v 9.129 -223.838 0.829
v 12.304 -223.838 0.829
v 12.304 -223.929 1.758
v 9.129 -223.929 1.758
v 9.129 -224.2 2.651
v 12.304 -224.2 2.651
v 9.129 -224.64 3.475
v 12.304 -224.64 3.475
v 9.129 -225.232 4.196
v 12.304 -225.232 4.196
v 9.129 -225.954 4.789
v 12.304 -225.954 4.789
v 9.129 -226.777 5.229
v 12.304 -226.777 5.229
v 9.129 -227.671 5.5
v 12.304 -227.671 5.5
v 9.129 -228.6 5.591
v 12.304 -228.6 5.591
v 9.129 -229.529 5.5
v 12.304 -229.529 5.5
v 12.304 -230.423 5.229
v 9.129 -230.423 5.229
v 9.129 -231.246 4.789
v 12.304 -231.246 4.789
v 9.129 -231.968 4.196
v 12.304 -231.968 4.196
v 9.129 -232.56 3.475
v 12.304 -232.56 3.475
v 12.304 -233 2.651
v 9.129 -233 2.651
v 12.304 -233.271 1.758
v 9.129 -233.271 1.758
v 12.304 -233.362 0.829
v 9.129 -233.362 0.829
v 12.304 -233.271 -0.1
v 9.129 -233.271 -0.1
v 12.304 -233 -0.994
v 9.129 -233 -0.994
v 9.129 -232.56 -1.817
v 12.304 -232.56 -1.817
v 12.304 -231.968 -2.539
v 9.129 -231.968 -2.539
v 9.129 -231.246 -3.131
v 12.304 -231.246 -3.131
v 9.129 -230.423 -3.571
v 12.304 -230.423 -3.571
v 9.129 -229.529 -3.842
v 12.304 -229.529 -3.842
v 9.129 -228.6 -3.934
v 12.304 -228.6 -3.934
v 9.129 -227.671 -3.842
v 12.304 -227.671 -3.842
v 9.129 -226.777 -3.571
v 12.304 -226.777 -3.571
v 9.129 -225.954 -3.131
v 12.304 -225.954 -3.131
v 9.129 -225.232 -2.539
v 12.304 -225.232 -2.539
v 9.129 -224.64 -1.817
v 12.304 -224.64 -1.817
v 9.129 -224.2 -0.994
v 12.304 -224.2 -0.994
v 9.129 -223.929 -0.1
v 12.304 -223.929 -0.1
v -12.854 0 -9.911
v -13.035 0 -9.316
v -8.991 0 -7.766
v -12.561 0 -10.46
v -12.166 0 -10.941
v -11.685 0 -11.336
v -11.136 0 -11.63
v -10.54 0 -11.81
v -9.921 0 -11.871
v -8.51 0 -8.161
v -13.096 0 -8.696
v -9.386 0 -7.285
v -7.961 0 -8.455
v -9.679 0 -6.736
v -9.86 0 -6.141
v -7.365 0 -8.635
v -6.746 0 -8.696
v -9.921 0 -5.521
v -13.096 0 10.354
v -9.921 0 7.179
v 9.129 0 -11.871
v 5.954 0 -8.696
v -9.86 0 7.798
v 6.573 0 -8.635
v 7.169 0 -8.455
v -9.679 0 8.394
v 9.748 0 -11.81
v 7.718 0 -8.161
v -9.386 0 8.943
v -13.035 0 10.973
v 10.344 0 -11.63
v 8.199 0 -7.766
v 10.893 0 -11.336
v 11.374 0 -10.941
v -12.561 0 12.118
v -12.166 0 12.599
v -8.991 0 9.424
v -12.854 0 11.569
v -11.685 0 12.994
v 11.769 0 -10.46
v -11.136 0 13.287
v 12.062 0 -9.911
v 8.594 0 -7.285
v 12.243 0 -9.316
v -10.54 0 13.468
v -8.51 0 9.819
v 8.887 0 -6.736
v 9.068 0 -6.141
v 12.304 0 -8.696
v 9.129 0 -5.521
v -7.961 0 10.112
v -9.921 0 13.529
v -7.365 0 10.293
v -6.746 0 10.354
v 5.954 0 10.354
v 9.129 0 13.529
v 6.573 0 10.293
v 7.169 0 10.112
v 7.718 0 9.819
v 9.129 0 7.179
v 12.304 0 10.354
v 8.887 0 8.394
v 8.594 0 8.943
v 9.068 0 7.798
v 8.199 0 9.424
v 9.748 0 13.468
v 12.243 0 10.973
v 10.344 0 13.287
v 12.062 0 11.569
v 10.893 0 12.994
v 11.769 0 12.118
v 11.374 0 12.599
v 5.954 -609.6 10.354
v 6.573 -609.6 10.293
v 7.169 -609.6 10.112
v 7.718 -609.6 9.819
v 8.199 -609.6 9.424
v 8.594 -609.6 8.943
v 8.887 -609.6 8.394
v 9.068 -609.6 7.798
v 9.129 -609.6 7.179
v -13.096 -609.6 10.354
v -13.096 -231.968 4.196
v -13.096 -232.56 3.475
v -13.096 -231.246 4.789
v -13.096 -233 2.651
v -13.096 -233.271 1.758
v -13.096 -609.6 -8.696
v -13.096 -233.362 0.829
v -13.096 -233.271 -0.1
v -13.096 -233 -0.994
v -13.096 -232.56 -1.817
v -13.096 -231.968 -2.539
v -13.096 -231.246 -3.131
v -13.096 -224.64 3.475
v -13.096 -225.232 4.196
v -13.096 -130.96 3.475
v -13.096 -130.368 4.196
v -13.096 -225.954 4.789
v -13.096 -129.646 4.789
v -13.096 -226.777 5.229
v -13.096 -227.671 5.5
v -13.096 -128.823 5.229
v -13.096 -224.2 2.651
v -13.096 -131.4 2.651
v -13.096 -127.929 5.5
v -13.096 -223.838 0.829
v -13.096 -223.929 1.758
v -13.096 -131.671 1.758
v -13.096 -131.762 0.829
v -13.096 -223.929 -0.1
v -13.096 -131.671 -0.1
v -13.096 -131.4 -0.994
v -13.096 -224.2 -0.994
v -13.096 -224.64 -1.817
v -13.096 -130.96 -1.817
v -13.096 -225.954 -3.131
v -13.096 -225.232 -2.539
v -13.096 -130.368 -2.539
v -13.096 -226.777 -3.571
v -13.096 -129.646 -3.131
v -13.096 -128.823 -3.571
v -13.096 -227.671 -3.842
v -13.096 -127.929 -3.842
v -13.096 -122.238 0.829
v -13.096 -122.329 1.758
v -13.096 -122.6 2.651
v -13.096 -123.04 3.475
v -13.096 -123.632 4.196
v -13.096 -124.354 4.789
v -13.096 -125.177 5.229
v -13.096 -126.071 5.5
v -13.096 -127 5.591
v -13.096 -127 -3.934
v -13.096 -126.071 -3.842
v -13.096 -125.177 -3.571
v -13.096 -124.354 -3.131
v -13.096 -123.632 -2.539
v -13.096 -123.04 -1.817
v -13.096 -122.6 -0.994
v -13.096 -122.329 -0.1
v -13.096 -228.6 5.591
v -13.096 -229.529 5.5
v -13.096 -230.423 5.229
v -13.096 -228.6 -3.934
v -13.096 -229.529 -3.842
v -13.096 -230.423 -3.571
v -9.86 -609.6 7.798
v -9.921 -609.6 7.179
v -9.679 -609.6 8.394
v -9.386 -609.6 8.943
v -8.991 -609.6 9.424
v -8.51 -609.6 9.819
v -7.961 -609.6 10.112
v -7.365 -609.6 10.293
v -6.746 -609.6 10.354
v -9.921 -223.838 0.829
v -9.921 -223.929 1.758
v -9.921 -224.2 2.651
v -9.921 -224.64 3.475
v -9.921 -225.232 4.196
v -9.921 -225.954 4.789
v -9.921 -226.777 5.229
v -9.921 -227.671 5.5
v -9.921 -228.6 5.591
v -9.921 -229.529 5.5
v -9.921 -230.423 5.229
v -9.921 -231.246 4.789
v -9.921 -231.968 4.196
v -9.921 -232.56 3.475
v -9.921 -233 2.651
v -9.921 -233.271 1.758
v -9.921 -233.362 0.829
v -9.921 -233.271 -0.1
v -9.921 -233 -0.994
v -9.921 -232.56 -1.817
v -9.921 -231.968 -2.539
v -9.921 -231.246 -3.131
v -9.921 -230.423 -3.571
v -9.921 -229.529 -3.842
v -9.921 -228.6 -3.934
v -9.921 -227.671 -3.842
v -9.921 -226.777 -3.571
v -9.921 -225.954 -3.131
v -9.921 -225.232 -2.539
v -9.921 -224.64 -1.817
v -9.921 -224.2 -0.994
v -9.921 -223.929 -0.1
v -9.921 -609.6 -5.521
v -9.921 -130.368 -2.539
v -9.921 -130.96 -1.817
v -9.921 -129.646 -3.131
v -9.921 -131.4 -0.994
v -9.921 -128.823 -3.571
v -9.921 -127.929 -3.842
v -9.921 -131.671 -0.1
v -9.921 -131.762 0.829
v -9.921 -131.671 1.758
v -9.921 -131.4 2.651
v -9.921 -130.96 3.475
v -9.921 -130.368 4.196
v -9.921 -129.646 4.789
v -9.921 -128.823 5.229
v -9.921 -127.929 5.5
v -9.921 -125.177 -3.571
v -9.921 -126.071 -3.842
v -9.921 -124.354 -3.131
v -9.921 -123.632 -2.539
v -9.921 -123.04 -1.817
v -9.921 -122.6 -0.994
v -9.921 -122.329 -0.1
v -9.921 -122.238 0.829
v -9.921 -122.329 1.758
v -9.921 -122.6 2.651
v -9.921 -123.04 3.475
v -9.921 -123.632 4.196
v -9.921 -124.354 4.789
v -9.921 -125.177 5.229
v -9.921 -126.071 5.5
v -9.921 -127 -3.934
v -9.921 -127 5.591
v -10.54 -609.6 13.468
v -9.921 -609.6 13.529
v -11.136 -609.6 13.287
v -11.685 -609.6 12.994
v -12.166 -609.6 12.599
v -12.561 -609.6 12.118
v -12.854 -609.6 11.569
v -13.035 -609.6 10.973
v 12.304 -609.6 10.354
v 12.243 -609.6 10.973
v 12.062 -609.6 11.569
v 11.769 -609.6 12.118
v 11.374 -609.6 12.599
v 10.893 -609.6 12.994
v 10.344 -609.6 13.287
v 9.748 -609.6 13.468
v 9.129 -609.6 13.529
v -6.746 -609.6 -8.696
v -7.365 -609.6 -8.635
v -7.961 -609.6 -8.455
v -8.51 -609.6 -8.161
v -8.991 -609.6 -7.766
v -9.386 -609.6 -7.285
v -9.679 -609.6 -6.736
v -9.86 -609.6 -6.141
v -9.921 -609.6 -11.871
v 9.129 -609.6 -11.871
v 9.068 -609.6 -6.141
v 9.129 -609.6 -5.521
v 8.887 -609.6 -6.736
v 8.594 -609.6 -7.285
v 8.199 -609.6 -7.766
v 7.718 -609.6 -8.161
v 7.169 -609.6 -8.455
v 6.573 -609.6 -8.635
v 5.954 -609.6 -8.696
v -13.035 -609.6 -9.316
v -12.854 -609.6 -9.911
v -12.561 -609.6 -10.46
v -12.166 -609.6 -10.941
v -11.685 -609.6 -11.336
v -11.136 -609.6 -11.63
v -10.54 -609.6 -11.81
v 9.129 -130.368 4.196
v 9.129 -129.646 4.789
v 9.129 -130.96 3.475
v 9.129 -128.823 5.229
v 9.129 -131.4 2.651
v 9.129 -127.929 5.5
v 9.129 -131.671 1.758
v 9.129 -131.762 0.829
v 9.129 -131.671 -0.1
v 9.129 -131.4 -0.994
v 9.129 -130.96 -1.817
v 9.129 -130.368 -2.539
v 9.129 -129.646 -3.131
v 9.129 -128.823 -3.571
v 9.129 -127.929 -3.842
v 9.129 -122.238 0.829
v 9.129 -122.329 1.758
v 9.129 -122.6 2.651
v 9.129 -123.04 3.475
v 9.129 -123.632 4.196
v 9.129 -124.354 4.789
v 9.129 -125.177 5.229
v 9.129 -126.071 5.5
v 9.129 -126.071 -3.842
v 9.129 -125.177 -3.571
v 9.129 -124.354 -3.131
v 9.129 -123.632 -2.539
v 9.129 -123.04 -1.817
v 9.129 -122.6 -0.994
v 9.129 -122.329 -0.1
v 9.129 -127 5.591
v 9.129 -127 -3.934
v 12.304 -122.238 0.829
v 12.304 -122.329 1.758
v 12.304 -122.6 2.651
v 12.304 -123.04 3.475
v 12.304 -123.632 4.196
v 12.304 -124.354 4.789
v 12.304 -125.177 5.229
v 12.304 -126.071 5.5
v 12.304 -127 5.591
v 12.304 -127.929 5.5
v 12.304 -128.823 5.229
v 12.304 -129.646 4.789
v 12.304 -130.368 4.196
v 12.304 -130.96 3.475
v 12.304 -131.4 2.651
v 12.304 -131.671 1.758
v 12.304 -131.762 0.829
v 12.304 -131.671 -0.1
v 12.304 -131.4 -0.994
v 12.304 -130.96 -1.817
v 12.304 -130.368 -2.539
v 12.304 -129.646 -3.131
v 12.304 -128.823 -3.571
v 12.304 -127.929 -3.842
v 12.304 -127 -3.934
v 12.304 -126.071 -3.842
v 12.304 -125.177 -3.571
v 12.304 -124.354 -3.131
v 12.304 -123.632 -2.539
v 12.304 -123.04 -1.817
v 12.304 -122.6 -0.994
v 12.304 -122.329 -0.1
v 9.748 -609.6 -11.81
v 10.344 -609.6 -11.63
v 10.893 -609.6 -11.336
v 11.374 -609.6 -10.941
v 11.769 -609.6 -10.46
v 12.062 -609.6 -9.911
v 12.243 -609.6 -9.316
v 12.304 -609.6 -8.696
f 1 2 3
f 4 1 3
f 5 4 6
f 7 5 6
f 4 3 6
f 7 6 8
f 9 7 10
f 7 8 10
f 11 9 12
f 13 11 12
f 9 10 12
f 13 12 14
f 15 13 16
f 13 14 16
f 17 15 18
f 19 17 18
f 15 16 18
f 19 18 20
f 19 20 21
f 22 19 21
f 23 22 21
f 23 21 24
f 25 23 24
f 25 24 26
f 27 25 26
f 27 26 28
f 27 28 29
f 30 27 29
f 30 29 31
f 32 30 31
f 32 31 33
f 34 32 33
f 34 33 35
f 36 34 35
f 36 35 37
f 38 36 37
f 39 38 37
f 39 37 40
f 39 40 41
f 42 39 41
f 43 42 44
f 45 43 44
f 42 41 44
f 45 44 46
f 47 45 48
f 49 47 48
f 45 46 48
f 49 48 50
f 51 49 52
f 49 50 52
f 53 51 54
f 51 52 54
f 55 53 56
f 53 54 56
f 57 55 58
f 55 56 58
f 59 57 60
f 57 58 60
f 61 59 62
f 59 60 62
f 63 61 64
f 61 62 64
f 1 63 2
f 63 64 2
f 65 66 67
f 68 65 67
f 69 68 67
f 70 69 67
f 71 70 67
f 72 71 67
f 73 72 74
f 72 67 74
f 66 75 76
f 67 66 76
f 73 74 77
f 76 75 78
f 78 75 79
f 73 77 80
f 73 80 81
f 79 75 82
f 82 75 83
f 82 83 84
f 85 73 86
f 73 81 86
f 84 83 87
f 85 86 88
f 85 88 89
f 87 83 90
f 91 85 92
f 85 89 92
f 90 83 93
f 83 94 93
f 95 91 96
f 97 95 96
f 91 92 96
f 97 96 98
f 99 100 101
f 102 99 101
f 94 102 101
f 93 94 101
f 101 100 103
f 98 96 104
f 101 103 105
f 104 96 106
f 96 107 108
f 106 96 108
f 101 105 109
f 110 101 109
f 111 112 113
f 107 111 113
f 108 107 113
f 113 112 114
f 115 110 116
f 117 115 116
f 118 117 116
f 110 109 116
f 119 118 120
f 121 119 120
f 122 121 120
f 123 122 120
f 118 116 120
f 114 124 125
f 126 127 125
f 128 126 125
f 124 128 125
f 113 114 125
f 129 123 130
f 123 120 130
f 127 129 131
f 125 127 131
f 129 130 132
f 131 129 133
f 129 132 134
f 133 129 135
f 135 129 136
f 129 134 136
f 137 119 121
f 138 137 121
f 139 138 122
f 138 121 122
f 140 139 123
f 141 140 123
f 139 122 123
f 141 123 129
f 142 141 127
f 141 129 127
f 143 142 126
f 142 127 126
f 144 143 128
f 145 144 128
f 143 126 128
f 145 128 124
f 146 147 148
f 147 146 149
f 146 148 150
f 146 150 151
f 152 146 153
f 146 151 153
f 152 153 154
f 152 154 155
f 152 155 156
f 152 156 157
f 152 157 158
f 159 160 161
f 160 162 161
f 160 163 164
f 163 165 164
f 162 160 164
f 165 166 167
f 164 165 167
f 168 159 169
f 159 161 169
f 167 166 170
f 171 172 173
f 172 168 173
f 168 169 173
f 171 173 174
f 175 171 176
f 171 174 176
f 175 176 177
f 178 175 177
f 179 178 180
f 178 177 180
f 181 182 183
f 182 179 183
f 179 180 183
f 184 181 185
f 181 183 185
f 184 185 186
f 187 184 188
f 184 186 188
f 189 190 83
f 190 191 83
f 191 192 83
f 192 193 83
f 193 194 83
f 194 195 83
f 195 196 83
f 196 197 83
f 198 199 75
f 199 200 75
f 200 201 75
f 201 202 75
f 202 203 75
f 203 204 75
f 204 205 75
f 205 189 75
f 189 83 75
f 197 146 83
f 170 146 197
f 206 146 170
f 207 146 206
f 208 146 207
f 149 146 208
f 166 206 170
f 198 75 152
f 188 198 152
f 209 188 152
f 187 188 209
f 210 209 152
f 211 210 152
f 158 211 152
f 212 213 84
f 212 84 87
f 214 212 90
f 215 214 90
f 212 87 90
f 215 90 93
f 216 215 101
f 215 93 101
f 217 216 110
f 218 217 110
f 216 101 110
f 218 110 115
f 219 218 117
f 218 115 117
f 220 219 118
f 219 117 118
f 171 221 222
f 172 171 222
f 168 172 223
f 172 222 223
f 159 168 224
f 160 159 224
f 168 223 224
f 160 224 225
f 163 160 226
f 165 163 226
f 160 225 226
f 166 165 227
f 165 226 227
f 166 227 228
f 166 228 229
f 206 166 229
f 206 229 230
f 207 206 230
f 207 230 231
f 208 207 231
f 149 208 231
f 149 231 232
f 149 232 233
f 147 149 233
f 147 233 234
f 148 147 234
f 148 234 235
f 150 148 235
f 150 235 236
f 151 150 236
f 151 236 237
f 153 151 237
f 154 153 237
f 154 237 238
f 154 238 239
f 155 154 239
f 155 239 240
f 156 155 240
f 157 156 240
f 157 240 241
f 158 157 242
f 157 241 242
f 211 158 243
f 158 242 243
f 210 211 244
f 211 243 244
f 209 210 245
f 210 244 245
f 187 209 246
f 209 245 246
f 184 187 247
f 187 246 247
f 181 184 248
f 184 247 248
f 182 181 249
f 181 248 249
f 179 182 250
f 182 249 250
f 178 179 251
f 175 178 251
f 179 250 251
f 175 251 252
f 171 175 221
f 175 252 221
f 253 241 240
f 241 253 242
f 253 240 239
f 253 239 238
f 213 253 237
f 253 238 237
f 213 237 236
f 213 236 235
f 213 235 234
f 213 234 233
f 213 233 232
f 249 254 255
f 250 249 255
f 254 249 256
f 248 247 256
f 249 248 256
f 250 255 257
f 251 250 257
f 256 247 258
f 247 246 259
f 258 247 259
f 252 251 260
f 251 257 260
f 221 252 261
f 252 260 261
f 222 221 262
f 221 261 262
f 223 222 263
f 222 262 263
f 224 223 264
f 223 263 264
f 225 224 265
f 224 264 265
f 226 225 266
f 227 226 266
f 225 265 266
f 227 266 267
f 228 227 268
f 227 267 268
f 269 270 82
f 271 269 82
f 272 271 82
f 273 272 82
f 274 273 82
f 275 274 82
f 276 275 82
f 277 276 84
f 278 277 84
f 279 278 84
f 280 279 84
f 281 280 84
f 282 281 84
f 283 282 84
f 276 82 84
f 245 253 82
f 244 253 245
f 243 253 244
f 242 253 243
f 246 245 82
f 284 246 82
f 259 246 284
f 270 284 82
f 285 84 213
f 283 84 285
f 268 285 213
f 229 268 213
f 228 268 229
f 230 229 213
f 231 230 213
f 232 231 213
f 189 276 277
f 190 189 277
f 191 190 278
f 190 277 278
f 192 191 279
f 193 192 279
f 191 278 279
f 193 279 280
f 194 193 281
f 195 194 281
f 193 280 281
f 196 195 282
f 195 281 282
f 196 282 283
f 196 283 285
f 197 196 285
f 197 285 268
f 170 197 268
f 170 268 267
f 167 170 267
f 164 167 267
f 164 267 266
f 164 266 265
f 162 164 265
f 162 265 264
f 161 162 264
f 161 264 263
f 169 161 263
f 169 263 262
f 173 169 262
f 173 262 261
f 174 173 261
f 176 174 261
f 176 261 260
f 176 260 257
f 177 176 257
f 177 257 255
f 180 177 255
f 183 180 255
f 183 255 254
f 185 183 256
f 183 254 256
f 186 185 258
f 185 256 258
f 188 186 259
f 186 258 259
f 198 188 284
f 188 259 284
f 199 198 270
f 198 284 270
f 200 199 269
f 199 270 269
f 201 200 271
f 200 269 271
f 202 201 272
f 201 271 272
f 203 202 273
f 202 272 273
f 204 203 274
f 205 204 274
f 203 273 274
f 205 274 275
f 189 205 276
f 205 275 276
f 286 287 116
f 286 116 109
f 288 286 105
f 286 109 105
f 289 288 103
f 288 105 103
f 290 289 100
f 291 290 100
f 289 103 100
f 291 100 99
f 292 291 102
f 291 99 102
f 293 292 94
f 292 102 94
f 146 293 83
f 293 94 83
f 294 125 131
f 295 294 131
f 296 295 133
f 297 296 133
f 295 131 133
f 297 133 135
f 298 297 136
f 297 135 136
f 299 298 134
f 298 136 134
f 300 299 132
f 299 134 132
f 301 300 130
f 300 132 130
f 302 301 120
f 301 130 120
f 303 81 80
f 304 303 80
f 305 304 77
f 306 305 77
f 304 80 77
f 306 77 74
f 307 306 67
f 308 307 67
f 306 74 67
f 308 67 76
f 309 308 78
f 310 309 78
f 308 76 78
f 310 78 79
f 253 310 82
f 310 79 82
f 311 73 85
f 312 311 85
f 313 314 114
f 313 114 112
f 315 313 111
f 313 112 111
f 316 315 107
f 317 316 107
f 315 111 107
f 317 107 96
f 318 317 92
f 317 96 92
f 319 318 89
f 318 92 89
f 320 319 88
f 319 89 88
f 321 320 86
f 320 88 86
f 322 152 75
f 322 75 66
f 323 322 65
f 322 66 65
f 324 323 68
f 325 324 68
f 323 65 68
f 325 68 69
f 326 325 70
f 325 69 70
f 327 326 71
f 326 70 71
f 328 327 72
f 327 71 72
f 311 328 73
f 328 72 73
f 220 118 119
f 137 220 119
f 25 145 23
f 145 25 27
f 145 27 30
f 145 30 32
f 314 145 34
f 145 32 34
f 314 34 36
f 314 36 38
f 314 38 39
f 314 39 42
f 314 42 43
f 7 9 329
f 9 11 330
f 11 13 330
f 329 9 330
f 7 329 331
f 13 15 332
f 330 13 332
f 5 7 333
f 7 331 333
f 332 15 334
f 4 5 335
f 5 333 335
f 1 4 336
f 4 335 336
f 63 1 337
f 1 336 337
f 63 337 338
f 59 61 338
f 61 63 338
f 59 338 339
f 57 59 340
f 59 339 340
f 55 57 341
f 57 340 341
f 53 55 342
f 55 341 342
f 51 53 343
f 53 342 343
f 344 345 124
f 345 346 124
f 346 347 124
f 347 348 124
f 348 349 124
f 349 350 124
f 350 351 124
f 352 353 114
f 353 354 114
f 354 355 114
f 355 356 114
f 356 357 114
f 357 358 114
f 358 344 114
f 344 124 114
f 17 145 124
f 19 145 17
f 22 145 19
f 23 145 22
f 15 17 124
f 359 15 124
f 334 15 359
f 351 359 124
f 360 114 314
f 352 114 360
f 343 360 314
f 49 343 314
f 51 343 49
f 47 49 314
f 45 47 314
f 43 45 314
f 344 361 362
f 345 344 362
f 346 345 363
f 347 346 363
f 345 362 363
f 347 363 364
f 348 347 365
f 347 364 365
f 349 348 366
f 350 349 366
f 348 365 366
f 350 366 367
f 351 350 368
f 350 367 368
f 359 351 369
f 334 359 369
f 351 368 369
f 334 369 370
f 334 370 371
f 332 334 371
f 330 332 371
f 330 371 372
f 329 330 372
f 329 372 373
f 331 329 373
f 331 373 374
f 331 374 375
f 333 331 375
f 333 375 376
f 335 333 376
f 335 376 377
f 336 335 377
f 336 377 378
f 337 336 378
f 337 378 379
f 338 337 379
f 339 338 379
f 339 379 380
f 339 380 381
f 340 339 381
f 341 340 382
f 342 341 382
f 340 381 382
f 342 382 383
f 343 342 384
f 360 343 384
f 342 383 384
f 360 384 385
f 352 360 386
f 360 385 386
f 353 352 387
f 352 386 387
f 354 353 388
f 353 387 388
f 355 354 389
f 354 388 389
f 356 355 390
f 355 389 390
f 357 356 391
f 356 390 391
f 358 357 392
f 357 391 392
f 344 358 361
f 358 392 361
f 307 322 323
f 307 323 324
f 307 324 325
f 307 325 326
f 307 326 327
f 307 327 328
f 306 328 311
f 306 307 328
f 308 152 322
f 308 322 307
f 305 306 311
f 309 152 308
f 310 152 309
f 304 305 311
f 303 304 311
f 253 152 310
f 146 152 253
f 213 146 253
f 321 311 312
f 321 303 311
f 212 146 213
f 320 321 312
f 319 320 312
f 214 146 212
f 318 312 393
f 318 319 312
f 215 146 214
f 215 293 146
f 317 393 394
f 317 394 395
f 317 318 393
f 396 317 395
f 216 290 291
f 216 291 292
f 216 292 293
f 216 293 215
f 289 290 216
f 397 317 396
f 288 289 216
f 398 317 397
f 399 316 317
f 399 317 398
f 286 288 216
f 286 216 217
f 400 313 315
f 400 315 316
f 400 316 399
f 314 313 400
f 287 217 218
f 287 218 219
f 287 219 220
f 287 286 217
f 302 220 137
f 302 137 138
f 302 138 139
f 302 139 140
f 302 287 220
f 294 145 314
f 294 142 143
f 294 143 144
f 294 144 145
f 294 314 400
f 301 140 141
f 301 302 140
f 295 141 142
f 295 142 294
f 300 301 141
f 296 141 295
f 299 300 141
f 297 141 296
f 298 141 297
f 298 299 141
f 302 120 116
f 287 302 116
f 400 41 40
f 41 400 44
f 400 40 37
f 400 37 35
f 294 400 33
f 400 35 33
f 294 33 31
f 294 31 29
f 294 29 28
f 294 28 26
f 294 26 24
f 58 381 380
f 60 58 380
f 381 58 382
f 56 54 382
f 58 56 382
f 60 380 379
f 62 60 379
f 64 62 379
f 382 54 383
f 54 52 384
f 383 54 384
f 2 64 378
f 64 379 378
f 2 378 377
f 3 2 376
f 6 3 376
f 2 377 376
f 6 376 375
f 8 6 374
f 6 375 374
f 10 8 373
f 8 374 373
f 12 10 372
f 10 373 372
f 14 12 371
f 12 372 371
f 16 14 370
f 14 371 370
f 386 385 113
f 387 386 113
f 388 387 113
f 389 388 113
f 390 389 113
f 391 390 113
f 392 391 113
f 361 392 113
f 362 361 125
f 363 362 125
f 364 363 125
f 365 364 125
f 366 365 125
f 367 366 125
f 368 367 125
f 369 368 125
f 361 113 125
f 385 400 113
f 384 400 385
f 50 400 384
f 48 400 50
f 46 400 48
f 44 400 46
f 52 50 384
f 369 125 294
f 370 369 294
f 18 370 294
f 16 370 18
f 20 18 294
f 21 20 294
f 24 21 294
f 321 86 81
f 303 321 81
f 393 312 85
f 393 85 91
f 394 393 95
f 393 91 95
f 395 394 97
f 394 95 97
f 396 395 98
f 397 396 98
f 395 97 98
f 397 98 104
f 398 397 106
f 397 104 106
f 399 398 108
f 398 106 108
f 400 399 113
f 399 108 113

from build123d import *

# Parameters (mm, degrees)
F1_DEPTH = 609.6
F2_R     = 4.7625
F3_DEPTH = 25.4


with BuildPart() as f1:
    # F0 (on Front) → F1 (new body)
    with BuildSketch(Plane.XZ):
        with BuildLine():
            Line((-9.921028, -11.871202), (9.128972, -11.871202))
            ThreePointArc((9.128972, -11.871202), (11.374036, -10.941266), (12.303972, -8.696202))
            Line((12.303972, -8.696202), (12.303972, 10.353798))
            ThreePointArc((12.303972, 10.353798), (11.374036, 12.598862), (9.128972, 13.528798))
            Line((9.128972, 13.528798), (-9.921028, 13.528798))
            ThreePointArc((-9.921028, 13.528798), (-12.166092, 12.598862), (-13.096028, 10.353798))
            Line((-13.096028, 10.353798), (-13.096028, -8.696202))
            ThreePointArc((-13.096028, -8.696202), (-12.166092, -10.941266), (-9.921028, -11.871202))
        make_face()
        with BuildLine():
            ThreePointArc((9.128972, -5.521202), (8.199036, -7.766266), (5.953972, -8.696202))
            Line((5.953972, -8.696202), (-6.746028, -8.696202))
            ThreePointArc((-6.746028, -8.696202), (-8.991092, -7.766266), (-9.921028, -5.521202))
            Line((-9.921028, -5.521202), (-9.921028, 7.178798))
            ThreePointArc((-9.921028, 7.178798), (-8.991092, 9.423862), (-6.746028, 10.353798))
            Line((-6.746028, 10.353798), (5.953972, 10.353798))
            ThreePointArc((5.953972, 10.353798), (8.199036, 9.423862), (9.128972, 7.178798))
            Line((9.128972, 7.178798), (9.128972, -5.521202))
        make_face(mode=Mode.SUBTRACT)
    extrude(amount=F1_DEPTH)

    # F2 (on face) → F3 (cut)
    with BuildSketch(Plane.YZ.offset(12.303972)):
        with Locations((-228.6, 0.828798)):
            Circle(F2_R)
        with Locations((-127, 0.828798)):
            Circle(F2_R)
    extrude(amount=-F3_DEPTH, mode=Mode.SUBTRACT)


solid = f1.part
